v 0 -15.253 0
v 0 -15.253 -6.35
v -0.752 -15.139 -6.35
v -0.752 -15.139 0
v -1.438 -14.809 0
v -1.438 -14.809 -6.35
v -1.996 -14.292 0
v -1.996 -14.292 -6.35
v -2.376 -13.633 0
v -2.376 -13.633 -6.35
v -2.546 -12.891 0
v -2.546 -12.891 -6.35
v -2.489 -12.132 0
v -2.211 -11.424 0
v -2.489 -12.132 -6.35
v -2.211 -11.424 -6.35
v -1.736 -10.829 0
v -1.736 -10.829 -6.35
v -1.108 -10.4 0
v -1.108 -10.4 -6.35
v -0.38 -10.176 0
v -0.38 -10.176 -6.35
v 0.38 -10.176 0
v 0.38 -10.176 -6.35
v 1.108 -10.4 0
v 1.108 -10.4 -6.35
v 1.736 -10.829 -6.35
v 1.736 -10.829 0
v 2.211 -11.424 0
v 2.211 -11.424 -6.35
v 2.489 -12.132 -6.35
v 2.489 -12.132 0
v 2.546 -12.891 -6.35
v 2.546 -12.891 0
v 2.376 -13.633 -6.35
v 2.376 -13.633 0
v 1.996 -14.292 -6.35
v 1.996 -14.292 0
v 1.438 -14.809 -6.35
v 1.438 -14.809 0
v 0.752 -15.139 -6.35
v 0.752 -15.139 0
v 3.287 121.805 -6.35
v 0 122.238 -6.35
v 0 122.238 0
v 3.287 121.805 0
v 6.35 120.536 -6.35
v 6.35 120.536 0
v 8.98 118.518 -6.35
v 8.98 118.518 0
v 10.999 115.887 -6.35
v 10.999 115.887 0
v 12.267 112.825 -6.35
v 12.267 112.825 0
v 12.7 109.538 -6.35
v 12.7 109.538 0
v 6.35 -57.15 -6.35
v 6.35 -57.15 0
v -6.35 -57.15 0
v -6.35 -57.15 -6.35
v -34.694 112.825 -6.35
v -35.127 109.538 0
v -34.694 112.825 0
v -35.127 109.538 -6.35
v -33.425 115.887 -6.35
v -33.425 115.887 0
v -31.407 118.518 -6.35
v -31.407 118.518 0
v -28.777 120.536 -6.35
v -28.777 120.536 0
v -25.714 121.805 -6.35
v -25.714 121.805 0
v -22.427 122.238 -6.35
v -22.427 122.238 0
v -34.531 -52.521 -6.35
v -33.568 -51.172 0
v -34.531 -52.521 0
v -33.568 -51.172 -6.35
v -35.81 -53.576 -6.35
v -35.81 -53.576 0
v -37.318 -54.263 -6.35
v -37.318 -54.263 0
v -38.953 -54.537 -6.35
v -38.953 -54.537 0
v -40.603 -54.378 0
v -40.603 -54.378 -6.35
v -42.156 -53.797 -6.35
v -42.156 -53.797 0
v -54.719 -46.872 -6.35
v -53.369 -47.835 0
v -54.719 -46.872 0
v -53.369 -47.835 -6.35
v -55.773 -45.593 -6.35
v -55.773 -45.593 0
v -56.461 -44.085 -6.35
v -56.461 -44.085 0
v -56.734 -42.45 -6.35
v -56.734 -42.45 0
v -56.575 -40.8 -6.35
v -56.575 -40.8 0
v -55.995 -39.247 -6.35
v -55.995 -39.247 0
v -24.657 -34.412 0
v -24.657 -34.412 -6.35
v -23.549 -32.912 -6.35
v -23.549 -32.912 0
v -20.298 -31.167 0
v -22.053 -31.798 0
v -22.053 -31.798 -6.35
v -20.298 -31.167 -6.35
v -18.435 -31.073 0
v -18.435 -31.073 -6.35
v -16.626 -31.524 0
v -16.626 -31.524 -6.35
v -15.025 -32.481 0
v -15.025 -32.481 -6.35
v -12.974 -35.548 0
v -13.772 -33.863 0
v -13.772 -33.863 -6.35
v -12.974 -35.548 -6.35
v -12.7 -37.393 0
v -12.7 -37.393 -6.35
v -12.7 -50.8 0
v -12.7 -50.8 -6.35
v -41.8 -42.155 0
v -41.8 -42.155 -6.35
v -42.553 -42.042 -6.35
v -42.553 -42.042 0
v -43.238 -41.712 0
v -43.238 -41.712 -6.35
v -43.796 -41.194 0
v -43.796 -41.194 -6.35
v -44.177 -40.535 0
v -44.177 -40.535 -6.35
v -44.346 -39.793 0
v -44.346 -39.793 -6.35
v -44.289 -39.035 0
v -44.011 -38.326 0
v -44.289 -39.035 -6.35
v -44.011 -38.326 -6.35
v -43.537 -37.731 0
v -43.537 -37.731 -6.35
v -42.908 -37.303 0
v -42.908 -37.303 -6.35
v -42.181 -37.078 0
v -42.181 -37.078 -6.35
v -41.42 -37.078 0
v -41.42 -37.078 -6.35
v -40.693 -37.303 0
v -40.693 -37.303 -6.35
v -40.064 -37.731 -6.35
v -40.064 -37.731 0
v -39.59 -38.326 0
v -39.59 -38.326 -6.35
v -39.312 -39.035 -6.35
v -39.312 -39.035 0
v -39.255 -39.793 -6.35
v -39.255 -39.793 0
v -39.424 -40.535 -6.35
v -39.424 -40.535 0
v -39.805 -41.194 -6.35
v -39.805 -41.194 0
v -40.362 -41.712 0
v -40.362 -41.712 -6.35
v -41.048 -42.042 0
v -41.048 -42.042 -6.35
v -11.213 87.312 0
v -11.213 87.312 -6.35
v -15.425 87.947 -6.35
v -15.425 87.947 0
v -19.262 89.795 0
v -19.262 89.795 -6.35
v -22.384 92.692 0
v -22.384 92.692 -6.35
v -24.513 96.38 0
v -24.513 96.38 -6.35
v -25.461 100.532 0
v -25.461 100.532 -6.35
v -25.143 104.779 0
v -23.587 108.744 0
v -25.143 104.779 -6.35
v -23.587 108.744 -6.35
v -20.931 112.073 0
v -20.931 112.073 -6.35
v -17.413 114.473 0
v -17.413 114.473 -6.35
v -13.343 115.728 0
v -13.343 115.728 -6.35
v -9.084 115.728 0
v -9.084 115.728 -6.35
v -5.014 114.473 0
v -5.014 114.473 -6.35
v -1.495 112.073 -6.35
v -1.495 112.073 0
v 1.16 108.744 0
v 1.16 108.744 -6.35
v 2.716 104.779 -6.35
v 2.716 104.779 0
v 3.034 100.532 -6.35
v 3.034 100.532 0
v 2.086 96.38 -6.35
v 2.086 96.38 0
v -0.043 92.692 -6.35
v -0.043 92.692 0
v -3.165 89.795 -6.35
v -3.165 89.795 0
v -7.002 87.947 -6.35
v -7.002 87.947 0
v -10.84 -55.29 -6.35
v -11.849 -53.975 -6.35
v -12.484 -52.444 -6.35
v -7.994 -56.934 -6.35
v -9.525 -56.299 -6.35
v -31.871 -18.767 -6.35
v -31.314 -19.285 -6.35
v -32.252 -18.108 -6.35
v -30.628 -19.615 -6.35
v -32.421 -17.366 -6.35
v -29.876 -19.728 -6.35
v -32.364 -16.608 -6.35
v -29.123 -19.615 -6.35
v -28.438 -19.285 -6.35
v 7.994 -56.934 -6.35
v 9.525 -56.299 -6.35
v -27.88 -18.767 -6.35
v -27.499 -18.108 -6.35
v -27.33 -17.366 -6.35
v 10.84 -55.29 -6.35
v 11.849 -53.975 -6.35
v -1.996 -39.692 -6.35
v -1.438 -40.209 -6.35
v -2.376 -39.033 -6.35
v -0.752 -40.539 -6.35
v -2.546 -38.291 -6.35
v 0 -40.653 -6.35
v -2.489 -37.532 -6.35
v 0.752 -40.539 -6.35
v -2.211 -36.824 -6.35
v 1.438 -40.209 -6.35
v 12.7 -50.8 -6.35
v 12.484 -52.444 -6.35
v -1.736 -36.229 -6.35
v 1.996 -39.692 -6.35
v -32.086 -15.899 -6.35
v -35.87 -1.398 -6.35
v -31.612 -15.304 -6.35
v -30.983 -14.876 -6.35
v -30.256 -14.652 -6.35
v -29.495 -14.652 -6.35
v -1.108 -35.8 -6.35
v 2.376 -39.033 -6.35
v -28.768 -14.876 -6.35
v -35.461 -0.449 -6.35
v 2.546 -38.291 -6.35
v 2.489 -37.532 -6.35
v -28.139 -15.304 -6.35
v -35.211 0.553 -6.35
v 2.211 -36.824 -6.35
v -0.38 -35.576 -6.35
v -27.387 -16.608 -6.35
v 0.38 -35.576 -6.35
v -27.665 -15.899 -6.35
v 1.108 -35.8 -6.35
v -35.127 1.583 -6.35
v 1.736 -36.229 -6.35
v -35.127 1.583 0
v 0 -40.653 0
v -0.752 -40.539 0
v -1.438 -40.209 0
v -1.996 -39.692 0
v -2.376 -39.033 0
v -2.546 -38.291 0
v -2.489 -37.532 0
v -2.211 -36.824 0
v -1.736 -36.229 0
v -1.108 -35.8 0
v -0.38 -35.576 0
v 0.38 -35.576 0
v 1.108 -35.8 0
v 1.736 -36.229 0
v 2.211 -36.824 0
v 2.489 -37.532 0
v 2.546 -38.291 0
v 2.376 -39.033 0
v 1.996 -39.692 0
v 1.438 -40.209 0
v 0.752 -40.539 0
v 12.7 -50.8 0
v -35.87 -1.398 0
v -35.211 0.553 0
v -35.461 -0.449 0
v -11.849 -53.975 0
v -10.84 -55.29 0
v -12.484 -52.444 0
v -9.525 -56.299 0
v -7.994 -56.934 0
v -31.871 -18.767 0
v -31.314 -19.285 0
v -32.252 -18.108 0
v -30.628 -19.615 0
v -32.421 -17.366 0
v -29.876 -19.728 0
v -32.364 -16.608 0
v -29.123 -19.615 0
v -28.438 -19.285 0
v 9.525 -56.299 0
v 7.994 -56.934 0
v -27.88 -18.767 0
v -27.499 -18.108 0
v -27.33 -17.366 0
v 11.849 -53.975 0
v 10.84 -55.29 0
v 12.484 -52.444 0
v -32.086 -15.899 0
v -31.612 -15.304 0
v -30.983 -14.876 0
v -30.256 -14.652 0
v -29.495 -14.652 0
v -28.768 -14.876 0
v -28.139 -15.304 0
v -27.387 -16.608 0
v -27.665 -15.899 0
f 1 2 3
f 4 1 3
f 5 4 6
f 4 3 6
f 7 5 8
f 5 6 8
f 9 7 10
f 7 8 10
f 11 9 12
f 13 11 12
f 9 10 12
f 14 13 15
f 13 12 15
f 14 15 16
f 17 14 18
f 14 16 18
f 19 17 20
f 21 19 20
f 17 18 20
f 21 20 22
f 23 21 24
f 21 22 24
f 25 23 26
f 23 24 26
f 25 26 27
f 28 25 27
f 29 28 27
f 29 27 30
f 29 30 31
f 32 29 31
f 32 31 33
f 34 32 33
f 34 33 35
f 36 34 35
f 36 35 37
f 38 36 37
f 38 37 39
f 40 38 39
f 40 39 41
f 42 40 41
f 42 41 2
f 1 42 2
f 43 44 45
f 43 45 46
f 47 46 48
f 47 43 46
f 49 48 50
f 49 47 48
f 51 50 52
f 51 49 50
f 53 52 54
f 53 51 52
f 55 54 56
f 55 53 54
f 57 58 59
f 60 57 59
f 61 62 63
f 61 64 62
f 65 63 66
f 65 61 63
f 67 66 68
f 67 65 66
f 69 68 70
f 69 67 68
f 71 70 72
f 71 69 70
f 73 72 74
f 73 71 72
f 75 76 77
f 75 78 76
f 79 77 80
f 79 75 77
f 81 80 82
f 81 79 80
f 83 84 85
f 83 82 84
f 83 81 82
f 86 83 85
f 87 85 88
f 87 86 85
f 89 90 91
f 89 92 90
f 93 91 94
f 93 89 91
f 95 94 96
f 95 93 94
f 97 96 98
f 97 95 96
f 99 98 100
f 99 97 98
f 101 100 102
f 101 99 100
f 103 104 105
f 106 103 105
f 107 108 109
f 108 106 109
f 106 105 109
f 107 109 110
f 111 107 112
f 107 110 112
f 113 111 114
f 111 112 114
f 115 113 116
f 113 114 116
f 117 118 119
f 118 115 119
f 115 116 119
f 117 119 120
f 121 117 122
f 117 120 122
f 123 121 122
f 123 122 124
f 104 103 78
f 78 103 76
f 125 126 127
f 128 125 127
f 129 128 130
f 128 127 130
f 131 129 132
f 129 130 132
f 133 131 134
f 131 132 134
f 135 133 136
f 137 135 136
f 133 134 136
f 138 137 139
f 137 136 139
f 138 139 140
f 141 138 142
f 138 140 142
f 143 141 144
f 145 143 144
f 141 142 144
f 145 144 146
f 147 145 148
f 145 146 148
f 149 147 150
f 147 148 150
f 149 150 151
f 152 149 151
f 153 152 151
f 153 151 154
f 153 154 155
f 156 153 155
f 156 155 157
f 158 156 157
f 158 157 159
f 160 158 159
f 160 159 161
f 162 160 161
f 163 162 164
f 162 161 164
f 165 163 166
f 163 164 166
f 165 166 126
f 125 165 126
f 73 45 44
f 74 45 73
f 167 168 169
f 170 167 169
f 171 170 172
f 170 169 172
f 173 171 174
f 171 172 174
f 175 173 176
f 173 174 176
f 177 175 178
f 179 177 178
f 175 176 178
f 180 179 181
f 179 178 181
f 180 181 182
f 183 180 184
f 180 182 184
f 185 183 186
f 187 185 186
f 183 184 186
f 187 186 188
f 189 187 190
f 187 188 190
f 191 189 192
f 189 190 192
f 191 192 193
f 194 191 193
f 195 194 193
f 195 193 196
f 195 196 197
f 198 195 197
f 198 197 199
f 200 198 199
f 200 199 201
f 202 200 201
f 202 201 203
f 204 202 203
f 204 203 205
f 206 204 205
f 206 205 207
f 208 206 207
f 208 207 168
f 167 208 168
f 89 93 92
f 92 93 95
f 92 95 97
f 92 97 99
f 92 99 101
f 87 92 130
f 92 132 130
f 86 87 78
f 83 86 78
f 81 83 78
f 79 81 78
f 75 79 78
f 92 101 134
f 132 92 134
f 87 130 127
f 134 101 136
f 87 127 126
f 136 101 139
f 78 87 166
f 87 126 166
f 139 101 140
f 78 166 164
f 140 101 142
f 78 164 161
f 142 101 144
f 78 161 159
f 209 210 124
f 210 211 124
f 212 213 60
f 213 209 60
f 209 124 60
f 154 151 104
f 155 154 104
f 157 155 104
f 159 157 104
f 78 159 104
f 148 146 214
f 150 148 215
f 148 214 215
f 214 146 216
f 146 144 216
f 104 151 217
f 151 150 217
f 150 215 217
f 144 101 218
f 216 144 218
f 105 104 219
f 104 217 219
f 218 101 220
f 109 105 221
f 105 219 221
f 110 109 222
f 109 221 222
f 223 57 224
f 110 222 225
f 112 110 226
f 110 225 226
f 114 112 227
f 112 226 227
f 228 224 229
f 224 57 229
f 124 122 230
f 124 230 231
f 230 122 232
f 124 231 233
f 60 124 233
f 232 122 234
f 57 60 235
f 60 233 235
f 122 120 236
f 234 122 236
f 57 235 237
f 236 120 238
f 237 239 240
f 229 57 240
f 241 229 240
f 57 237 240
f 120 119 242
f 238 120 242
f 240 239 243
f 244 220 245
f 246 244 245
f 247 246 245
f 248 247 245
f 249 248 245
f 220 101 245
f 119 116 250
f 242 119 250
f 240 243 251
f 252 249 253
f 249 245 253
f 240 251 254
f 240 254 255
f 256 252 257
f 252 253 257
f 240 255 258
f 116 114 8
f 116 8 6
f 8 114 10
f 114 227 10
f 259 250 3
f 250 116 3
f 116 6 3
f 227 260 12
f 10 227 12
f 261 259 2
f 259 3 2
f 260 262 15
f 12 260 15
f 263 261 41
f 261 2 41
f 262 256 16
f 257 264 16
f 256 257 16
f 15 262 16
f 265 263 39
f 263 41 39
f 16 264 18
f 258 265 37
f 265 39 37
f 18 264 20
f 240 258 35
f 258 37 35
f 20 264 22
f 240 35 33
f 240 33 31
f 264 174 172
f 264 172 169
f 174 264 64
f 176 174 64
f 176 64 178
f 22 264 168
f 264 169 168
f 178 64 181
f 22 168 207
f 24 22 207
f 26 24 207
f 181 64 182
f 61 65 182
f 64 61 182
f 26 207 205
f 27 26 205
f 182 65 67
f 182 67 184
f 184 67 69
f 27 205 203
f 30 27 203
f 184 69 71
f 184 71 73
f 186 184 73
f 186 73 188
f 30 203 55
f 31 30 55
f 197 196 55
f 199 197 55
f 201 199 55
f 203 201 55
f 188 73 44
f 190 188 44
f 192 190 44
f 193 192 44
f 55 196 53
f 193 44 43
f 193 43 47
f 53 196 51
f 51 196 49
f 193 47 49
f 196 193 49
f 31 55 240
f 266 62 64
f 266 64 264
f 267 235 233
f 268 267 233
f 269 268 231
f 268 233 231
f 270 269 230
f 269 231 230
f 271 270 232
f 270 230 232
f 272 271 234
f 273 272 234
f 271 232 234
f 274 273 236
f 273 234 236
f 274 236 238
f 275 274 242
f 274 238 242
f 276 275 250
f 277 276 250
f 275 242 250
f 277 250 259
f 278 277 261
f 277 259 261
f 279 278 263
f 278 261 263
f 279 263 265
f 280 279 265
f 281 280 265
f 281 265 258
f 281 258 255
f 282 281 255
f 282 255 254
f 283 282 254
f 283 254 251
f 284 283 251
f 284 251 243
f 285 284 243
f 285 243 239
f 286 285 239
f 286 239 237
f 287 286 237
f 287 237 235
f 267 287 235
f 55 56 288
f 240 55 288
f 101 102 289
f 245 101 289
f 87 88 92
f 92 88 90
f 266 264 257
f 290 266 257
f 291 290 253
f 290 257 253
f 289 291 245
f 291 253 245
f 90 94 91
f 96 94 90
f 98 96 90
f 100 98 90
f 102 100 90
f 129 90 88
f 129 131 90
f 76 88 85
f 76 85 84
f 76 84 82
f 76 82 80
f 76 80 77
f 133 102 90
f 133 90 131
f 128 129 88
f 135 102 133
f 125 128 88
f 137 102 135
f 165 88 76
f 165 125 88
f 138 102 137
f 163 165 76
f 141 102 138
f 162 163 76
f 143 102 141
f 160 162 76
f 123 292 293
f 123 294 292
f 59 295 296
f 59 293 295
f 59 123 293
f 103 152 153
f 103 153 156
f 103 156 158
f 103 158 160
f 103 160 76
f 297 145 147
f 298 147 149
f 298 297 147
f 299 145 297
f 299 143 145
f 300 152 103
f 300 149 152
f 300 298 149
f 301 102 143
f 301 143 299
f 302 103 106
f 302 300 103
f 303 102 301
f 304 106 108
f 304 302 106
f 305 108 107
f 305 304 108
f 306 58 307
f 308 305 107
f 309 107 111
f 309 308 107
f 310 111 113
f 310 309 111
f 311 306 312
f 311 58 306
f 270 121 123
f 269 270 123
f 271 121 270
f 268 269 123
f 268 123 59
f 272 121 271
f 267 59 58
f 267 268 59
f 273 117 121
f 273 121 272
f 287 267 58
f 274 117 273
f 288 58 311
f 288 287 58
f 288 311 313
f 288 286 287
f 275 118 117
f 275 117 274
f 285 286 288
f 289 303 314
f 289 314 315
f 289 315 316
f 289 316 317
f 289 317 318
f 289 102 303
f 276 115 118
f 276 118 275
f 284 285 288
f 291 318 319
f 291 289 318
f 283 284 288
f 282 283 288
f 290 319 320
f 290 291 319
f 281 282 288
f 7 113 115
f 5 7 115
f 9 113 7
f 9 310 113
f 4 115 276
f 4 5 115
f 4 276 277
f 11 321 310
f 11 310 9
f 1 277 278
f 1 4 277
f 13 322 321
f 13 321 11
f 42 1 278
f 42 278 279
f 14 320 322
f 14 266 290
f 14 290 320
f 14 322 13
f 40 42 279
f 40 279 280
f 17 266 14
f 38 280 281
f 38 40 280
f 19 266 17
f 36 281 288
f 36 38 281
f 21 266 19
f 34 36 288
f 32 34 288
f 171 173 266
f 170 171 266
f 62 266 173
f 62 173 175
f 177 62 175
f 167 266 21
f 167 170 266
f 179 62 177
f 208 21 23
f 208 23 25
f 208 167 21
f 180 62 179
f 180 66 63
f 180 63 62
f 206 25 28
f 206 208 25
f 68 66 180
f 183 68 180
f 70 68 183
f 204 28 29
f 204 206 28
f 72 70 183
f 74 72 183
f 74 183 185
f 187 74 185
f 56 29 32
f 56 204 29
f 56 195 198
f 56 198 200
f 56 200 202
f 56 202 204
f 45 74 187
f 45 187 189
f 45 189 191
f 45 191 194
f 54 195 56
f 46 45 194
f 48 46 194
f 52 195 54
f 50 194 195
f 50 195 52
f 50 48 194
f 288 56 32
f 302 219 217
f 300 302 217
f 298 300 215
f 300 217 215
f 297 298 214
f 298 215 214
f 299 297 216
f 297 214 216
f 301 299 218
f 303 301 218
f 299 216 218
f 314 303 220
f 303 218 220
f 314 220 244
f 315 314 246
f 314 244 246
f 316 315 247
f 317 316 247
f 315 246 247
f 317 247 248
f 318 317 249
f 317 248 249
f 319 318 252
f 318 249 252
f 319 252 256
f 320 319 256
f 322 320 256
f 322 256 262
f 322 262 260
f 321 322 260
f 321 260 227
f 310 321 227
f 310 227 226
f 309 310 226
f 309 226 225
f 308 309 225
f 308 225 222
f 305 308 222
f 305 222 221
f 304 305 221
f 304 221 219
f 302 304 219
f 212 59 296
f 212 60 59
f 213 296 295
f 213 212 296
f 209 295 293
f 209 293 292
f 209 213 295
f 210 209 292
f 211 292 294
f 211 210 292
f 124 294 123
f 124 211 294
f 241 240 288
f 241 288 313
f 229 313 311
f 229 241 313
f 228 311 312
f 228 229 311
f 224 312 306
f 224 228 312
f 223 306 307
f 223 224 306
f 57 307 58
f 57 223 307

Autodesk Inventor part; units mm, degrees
ref_plane "YZ Plane" through (0, 0, 0) normal (1, 0, 0) x (0, 1, 0)
ref_plane "XZ Plane" through (0, 0, 0) normal (0, 1, 0) x (-1, 0, 0)
ref_plane "XY Plane" through (0, 0, 0) normal (0, 0, 1) x (1, 0, 0)
sketch "Sketch1" plane through (0, 0, 0) normal (0, 0, 1) x (1, 0, 0)
  line L0 (-12.7, 0) -> (12.7, 0) construction
  line L1 (12.7, 0) -> (12.7, -57.15)
  line L2 (12.7, -57.15) -> (-12.7, -57.15)
  line L3 (-12.7, -57.15) -> (-12.7, 0) construction
  line L4 (-35.1269, 0) -> (-12.7, -11.9246) construction
  line L5 (-12.7, -11.9246) -> (-36.5492, -56.7783)
  line L6 (-36.5492, -56.7783) -> (-58.976, -44.8537)
  line L7 (-58.976, -44.8537) -> (-35.1269, 0)
  line L8 (-23.9134, -5.9623) -> (-47.7626, -50.816) construction
  line L9 (-35.1269, 0) -> (12.7, 0)
  line L10 (-12.7, -11.9246) -> (-12.7, -57.15)
  point P0 (0, 0)
  point P1 (0, 0)
  point P2 (-29.8757, -17.1757)
  point P3 (-41.8003, -39.6026)
  point P4 (0, -12.7)
  point P5 (0, -38.1)
  dimension "d0" = 25.4
  dimension "d1" = 25.4
  dimension "d2" = 28
  dimension "d3" = 50.8
  dimension "d4" = 25.4
  dimension "d5" = 12.7
  dimension "d6" = 25.4
  dimension "d7" = 12.7
  dimension "d8" = 57.15
extrude "Extrusion1" add sketch "Sketch1" against normal blind 6.35
hole "Hole1" at (-29.8757, -17.1757, 0) at (-41.8003, -39.6026, 0) at (0, -12.7, 0) at (0, -38.1, 0) direction (0, 0, -1) diameter 5.1054 end through all clearance for "Flat Head Machine Screw (82)" size "#10" standard "Ansi Unified Screw Threads"
sketch "Sketch2" plane through (0, 0, 0) normal (0, 0, 1) x (1, 0, 0)
  circle A0 centre (0, -12.7) radius 2.5527 construction
  circle A1 centre (-29.8757, -17.1757) radius 2.5527 construction
  circle A2 centre (-41.8003, -39.6026) radius 2.5527 construction
  circle A3 centre (0, -38.1) radius 2.5527 construction
  line L0 (-12.7, -57.15) -> (12.7, -57.15) construction
  line L1 (12.7, -57.15) -> (12.7, 0) construction
  line L2 (12.7, 0) -> (-35.1269, 0) projected
  line L3 (-35.1269, 0) -> (-58.976, -44.8537) construction
  line L4 (-58.976, -44.8537) -> (-36.5492, -56.7783) construction
  line L5 (-36.5492, -56.7783) -> (-12.7, -11.9246) construction
  line L6 (-12.7, -11.9246) -> (-12.7, -57.15) construction
  circle A4 centre (0, -12.7) radius 2.5527 construction
  circle A5 centre (-29.8757, -17.1757) radius 2.5527 construction
  circle A6 centre (-41.8003, -39.6026) radius 2.5527 construction
  circle A7 centre (0, -38.1) radius 2.5527 construction
  line L7 (12.7, 0) -> (12.7, -57.15) construction
  line L8 (12.7, -57.15) -> (-12.7, -57.15) construction
  line L9 (-12.7, -57.15) -> (-12.7, -11.9246) construction
  line L10 (-36.5492, -56.7783) -> (-58.976, -44.8537) construction
  line L11 (-58.976, -44.8537) -> (-35.1269, 0) construction
  line L12 (-35.1269, 0) -> (12.7, 0) construction
  circle A8 centre (-11.2134, 101.6) radius 14.2875 construction
  line L13 (12.7, 0) -> (-35.1269, 0) construction
  line L14 (-35.1269, 0) -> (-58.976, -44.8537) construction
  circle A9 centre (0, -12.7) radius 2.5527 construction
  circle A10 centre (-29.8757, -17.1757) radius 2.5527 construction
  circle A11 centre (-41.8003, -39.6026) radius 2.5527 construction
  circle A12 centre (0, -38.1) radius 2.5527 construction
  line L15 (12.7, 0) -> (12.7, -57.15) construction
  line L16 (12.7, -57.15) -> (-12.7, -57.15) construction
  line L17 (-12.7, -57.15) -> (-12.7, -11.9246) construction
  line L18 (-36.5492, -56.7783) -> (-58.976, -44.8537) construction
  line L19 (-58.976, -44.8537) -> (-35.1269, 0) construction
  line L20 (-35.1269, 0) -> (12.7, 0) construction
  line L21 (-35.1269, 0) -> (12.7, 0) construction
  line L22 (12.7, 0) -> (12.7, 122.2375)
  line L23 (12.7, 122.2375) -> (-35.1269, 122.2375)
  line L24 (-35.1269, 122.2375) -> (-35.1269, 0)
  line L25 (-12.7, -11.9246) -> (-36.5492, -56.7783) projected
  line L26 (-35.1269, 122.2375) -> (-31.8509, 122.2375)
  line L27 (-31.8509, 122.2375) -> (-31.8509, 80.9625)
  line L28 (-31.8509, 80.9625) -> (-35.1269, 80.9625)
  line L29 (-35.1269, 80.9625) -> (-35.1269, 122.2375)
  line L30 (-12.7, -11.9246) -> (-36.5492, -56.7783) projected
  point P0 (0, 0)
  point P1 (-11.2134, 0)
  point P2 (-11.2134, 0)
  point P3 (-11.2134, 115.8875)
  point P4 (-11.2134, 122.2375)
  point P5 (-11.2134, 87.3125)
  point P6 (-25.5009, 101.6)
  point P7 (-35.1269, 80.9625)
  dimension "d19" = 28.575
  dimension "d20" = 101.6
  dimension "d32" = 6.35
  dimension "d36" = 0
  dimension "d37" = 6.35
  dimension "d38" = 6.35
extrude "Extrusion2" add sketch "Sketch2" against normal up to surface (6.35 mm away)
fillet "Fillet1" radius 6.35 6 edges at (12.7, -57.15, -3.175) (-12.7, -57.15, -3.175) (-12.7, -11.9246, -3.175) (-36.5492, -56.7783, -3.175) (-58.976, -44.8537, -3.175) (-35.1269, 0, -3.175)
hole "Hole2" at (-11.2134, 101.6, 0) direction (0, 0, -1) diameter 28.575 end through all
fillet "Fillet2" radius 12.7 2 edges at (12.7, 122.2375, -3.175) (-35.1269, 122.2375, -3.175)
equation "\"d37\" = d32"
equation "\"d38\" = d32"
properties part number "CL6-001" material "Aluminum 6061"
